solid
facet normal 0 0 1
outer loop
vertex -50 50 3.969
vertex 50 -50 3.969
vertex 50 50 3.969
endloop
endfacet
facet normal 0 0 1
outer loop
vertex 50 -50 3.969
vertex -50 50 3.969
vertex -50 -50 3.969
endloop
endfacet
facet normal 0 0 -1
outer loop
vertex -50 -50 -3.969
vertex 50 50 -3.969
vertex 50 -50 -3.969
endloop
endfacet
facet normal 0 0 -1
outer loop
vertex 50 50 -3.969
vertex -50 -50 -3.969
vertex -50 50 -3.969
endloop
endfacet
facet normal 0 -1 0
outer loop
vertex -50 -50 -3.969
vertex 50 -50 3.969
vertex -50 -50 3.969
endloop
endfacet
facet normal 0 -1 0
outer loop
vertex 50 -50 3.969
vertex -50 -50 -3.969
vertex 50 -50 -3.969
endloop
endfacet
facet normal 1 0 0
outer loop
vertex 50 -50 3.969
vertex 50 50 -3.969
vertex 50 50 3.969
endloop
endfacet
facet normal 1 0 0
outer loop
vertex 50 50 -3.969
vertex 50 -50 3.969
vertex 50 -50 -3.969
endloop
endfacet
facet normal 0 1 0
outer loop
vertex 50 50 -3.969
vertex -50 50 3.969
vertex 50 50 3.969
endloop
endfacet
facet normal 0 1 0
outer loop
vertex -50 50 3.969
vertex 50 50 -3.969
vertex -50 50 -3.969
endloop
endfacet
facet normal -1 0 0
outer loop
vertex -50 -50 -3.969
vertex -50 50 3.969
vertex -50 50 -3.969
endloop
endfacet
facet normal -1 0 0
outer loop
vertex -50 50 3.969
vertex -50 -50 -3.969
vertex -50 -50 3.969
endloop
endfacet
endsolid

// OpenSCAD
// Sheet parameters (mm)
sheet_L = 100;          // length
sheet_W = 100;          // width
sheet_T = 25.4 * 5/16;  // ~5/16" = 7.9375 mm

$fn = 64;

// One connected solid: a single sheet centered at origin
module sheet_body() {
  cube([sheet_L, sheet_W, sheet_T], center=true);
}

sheet_body();
